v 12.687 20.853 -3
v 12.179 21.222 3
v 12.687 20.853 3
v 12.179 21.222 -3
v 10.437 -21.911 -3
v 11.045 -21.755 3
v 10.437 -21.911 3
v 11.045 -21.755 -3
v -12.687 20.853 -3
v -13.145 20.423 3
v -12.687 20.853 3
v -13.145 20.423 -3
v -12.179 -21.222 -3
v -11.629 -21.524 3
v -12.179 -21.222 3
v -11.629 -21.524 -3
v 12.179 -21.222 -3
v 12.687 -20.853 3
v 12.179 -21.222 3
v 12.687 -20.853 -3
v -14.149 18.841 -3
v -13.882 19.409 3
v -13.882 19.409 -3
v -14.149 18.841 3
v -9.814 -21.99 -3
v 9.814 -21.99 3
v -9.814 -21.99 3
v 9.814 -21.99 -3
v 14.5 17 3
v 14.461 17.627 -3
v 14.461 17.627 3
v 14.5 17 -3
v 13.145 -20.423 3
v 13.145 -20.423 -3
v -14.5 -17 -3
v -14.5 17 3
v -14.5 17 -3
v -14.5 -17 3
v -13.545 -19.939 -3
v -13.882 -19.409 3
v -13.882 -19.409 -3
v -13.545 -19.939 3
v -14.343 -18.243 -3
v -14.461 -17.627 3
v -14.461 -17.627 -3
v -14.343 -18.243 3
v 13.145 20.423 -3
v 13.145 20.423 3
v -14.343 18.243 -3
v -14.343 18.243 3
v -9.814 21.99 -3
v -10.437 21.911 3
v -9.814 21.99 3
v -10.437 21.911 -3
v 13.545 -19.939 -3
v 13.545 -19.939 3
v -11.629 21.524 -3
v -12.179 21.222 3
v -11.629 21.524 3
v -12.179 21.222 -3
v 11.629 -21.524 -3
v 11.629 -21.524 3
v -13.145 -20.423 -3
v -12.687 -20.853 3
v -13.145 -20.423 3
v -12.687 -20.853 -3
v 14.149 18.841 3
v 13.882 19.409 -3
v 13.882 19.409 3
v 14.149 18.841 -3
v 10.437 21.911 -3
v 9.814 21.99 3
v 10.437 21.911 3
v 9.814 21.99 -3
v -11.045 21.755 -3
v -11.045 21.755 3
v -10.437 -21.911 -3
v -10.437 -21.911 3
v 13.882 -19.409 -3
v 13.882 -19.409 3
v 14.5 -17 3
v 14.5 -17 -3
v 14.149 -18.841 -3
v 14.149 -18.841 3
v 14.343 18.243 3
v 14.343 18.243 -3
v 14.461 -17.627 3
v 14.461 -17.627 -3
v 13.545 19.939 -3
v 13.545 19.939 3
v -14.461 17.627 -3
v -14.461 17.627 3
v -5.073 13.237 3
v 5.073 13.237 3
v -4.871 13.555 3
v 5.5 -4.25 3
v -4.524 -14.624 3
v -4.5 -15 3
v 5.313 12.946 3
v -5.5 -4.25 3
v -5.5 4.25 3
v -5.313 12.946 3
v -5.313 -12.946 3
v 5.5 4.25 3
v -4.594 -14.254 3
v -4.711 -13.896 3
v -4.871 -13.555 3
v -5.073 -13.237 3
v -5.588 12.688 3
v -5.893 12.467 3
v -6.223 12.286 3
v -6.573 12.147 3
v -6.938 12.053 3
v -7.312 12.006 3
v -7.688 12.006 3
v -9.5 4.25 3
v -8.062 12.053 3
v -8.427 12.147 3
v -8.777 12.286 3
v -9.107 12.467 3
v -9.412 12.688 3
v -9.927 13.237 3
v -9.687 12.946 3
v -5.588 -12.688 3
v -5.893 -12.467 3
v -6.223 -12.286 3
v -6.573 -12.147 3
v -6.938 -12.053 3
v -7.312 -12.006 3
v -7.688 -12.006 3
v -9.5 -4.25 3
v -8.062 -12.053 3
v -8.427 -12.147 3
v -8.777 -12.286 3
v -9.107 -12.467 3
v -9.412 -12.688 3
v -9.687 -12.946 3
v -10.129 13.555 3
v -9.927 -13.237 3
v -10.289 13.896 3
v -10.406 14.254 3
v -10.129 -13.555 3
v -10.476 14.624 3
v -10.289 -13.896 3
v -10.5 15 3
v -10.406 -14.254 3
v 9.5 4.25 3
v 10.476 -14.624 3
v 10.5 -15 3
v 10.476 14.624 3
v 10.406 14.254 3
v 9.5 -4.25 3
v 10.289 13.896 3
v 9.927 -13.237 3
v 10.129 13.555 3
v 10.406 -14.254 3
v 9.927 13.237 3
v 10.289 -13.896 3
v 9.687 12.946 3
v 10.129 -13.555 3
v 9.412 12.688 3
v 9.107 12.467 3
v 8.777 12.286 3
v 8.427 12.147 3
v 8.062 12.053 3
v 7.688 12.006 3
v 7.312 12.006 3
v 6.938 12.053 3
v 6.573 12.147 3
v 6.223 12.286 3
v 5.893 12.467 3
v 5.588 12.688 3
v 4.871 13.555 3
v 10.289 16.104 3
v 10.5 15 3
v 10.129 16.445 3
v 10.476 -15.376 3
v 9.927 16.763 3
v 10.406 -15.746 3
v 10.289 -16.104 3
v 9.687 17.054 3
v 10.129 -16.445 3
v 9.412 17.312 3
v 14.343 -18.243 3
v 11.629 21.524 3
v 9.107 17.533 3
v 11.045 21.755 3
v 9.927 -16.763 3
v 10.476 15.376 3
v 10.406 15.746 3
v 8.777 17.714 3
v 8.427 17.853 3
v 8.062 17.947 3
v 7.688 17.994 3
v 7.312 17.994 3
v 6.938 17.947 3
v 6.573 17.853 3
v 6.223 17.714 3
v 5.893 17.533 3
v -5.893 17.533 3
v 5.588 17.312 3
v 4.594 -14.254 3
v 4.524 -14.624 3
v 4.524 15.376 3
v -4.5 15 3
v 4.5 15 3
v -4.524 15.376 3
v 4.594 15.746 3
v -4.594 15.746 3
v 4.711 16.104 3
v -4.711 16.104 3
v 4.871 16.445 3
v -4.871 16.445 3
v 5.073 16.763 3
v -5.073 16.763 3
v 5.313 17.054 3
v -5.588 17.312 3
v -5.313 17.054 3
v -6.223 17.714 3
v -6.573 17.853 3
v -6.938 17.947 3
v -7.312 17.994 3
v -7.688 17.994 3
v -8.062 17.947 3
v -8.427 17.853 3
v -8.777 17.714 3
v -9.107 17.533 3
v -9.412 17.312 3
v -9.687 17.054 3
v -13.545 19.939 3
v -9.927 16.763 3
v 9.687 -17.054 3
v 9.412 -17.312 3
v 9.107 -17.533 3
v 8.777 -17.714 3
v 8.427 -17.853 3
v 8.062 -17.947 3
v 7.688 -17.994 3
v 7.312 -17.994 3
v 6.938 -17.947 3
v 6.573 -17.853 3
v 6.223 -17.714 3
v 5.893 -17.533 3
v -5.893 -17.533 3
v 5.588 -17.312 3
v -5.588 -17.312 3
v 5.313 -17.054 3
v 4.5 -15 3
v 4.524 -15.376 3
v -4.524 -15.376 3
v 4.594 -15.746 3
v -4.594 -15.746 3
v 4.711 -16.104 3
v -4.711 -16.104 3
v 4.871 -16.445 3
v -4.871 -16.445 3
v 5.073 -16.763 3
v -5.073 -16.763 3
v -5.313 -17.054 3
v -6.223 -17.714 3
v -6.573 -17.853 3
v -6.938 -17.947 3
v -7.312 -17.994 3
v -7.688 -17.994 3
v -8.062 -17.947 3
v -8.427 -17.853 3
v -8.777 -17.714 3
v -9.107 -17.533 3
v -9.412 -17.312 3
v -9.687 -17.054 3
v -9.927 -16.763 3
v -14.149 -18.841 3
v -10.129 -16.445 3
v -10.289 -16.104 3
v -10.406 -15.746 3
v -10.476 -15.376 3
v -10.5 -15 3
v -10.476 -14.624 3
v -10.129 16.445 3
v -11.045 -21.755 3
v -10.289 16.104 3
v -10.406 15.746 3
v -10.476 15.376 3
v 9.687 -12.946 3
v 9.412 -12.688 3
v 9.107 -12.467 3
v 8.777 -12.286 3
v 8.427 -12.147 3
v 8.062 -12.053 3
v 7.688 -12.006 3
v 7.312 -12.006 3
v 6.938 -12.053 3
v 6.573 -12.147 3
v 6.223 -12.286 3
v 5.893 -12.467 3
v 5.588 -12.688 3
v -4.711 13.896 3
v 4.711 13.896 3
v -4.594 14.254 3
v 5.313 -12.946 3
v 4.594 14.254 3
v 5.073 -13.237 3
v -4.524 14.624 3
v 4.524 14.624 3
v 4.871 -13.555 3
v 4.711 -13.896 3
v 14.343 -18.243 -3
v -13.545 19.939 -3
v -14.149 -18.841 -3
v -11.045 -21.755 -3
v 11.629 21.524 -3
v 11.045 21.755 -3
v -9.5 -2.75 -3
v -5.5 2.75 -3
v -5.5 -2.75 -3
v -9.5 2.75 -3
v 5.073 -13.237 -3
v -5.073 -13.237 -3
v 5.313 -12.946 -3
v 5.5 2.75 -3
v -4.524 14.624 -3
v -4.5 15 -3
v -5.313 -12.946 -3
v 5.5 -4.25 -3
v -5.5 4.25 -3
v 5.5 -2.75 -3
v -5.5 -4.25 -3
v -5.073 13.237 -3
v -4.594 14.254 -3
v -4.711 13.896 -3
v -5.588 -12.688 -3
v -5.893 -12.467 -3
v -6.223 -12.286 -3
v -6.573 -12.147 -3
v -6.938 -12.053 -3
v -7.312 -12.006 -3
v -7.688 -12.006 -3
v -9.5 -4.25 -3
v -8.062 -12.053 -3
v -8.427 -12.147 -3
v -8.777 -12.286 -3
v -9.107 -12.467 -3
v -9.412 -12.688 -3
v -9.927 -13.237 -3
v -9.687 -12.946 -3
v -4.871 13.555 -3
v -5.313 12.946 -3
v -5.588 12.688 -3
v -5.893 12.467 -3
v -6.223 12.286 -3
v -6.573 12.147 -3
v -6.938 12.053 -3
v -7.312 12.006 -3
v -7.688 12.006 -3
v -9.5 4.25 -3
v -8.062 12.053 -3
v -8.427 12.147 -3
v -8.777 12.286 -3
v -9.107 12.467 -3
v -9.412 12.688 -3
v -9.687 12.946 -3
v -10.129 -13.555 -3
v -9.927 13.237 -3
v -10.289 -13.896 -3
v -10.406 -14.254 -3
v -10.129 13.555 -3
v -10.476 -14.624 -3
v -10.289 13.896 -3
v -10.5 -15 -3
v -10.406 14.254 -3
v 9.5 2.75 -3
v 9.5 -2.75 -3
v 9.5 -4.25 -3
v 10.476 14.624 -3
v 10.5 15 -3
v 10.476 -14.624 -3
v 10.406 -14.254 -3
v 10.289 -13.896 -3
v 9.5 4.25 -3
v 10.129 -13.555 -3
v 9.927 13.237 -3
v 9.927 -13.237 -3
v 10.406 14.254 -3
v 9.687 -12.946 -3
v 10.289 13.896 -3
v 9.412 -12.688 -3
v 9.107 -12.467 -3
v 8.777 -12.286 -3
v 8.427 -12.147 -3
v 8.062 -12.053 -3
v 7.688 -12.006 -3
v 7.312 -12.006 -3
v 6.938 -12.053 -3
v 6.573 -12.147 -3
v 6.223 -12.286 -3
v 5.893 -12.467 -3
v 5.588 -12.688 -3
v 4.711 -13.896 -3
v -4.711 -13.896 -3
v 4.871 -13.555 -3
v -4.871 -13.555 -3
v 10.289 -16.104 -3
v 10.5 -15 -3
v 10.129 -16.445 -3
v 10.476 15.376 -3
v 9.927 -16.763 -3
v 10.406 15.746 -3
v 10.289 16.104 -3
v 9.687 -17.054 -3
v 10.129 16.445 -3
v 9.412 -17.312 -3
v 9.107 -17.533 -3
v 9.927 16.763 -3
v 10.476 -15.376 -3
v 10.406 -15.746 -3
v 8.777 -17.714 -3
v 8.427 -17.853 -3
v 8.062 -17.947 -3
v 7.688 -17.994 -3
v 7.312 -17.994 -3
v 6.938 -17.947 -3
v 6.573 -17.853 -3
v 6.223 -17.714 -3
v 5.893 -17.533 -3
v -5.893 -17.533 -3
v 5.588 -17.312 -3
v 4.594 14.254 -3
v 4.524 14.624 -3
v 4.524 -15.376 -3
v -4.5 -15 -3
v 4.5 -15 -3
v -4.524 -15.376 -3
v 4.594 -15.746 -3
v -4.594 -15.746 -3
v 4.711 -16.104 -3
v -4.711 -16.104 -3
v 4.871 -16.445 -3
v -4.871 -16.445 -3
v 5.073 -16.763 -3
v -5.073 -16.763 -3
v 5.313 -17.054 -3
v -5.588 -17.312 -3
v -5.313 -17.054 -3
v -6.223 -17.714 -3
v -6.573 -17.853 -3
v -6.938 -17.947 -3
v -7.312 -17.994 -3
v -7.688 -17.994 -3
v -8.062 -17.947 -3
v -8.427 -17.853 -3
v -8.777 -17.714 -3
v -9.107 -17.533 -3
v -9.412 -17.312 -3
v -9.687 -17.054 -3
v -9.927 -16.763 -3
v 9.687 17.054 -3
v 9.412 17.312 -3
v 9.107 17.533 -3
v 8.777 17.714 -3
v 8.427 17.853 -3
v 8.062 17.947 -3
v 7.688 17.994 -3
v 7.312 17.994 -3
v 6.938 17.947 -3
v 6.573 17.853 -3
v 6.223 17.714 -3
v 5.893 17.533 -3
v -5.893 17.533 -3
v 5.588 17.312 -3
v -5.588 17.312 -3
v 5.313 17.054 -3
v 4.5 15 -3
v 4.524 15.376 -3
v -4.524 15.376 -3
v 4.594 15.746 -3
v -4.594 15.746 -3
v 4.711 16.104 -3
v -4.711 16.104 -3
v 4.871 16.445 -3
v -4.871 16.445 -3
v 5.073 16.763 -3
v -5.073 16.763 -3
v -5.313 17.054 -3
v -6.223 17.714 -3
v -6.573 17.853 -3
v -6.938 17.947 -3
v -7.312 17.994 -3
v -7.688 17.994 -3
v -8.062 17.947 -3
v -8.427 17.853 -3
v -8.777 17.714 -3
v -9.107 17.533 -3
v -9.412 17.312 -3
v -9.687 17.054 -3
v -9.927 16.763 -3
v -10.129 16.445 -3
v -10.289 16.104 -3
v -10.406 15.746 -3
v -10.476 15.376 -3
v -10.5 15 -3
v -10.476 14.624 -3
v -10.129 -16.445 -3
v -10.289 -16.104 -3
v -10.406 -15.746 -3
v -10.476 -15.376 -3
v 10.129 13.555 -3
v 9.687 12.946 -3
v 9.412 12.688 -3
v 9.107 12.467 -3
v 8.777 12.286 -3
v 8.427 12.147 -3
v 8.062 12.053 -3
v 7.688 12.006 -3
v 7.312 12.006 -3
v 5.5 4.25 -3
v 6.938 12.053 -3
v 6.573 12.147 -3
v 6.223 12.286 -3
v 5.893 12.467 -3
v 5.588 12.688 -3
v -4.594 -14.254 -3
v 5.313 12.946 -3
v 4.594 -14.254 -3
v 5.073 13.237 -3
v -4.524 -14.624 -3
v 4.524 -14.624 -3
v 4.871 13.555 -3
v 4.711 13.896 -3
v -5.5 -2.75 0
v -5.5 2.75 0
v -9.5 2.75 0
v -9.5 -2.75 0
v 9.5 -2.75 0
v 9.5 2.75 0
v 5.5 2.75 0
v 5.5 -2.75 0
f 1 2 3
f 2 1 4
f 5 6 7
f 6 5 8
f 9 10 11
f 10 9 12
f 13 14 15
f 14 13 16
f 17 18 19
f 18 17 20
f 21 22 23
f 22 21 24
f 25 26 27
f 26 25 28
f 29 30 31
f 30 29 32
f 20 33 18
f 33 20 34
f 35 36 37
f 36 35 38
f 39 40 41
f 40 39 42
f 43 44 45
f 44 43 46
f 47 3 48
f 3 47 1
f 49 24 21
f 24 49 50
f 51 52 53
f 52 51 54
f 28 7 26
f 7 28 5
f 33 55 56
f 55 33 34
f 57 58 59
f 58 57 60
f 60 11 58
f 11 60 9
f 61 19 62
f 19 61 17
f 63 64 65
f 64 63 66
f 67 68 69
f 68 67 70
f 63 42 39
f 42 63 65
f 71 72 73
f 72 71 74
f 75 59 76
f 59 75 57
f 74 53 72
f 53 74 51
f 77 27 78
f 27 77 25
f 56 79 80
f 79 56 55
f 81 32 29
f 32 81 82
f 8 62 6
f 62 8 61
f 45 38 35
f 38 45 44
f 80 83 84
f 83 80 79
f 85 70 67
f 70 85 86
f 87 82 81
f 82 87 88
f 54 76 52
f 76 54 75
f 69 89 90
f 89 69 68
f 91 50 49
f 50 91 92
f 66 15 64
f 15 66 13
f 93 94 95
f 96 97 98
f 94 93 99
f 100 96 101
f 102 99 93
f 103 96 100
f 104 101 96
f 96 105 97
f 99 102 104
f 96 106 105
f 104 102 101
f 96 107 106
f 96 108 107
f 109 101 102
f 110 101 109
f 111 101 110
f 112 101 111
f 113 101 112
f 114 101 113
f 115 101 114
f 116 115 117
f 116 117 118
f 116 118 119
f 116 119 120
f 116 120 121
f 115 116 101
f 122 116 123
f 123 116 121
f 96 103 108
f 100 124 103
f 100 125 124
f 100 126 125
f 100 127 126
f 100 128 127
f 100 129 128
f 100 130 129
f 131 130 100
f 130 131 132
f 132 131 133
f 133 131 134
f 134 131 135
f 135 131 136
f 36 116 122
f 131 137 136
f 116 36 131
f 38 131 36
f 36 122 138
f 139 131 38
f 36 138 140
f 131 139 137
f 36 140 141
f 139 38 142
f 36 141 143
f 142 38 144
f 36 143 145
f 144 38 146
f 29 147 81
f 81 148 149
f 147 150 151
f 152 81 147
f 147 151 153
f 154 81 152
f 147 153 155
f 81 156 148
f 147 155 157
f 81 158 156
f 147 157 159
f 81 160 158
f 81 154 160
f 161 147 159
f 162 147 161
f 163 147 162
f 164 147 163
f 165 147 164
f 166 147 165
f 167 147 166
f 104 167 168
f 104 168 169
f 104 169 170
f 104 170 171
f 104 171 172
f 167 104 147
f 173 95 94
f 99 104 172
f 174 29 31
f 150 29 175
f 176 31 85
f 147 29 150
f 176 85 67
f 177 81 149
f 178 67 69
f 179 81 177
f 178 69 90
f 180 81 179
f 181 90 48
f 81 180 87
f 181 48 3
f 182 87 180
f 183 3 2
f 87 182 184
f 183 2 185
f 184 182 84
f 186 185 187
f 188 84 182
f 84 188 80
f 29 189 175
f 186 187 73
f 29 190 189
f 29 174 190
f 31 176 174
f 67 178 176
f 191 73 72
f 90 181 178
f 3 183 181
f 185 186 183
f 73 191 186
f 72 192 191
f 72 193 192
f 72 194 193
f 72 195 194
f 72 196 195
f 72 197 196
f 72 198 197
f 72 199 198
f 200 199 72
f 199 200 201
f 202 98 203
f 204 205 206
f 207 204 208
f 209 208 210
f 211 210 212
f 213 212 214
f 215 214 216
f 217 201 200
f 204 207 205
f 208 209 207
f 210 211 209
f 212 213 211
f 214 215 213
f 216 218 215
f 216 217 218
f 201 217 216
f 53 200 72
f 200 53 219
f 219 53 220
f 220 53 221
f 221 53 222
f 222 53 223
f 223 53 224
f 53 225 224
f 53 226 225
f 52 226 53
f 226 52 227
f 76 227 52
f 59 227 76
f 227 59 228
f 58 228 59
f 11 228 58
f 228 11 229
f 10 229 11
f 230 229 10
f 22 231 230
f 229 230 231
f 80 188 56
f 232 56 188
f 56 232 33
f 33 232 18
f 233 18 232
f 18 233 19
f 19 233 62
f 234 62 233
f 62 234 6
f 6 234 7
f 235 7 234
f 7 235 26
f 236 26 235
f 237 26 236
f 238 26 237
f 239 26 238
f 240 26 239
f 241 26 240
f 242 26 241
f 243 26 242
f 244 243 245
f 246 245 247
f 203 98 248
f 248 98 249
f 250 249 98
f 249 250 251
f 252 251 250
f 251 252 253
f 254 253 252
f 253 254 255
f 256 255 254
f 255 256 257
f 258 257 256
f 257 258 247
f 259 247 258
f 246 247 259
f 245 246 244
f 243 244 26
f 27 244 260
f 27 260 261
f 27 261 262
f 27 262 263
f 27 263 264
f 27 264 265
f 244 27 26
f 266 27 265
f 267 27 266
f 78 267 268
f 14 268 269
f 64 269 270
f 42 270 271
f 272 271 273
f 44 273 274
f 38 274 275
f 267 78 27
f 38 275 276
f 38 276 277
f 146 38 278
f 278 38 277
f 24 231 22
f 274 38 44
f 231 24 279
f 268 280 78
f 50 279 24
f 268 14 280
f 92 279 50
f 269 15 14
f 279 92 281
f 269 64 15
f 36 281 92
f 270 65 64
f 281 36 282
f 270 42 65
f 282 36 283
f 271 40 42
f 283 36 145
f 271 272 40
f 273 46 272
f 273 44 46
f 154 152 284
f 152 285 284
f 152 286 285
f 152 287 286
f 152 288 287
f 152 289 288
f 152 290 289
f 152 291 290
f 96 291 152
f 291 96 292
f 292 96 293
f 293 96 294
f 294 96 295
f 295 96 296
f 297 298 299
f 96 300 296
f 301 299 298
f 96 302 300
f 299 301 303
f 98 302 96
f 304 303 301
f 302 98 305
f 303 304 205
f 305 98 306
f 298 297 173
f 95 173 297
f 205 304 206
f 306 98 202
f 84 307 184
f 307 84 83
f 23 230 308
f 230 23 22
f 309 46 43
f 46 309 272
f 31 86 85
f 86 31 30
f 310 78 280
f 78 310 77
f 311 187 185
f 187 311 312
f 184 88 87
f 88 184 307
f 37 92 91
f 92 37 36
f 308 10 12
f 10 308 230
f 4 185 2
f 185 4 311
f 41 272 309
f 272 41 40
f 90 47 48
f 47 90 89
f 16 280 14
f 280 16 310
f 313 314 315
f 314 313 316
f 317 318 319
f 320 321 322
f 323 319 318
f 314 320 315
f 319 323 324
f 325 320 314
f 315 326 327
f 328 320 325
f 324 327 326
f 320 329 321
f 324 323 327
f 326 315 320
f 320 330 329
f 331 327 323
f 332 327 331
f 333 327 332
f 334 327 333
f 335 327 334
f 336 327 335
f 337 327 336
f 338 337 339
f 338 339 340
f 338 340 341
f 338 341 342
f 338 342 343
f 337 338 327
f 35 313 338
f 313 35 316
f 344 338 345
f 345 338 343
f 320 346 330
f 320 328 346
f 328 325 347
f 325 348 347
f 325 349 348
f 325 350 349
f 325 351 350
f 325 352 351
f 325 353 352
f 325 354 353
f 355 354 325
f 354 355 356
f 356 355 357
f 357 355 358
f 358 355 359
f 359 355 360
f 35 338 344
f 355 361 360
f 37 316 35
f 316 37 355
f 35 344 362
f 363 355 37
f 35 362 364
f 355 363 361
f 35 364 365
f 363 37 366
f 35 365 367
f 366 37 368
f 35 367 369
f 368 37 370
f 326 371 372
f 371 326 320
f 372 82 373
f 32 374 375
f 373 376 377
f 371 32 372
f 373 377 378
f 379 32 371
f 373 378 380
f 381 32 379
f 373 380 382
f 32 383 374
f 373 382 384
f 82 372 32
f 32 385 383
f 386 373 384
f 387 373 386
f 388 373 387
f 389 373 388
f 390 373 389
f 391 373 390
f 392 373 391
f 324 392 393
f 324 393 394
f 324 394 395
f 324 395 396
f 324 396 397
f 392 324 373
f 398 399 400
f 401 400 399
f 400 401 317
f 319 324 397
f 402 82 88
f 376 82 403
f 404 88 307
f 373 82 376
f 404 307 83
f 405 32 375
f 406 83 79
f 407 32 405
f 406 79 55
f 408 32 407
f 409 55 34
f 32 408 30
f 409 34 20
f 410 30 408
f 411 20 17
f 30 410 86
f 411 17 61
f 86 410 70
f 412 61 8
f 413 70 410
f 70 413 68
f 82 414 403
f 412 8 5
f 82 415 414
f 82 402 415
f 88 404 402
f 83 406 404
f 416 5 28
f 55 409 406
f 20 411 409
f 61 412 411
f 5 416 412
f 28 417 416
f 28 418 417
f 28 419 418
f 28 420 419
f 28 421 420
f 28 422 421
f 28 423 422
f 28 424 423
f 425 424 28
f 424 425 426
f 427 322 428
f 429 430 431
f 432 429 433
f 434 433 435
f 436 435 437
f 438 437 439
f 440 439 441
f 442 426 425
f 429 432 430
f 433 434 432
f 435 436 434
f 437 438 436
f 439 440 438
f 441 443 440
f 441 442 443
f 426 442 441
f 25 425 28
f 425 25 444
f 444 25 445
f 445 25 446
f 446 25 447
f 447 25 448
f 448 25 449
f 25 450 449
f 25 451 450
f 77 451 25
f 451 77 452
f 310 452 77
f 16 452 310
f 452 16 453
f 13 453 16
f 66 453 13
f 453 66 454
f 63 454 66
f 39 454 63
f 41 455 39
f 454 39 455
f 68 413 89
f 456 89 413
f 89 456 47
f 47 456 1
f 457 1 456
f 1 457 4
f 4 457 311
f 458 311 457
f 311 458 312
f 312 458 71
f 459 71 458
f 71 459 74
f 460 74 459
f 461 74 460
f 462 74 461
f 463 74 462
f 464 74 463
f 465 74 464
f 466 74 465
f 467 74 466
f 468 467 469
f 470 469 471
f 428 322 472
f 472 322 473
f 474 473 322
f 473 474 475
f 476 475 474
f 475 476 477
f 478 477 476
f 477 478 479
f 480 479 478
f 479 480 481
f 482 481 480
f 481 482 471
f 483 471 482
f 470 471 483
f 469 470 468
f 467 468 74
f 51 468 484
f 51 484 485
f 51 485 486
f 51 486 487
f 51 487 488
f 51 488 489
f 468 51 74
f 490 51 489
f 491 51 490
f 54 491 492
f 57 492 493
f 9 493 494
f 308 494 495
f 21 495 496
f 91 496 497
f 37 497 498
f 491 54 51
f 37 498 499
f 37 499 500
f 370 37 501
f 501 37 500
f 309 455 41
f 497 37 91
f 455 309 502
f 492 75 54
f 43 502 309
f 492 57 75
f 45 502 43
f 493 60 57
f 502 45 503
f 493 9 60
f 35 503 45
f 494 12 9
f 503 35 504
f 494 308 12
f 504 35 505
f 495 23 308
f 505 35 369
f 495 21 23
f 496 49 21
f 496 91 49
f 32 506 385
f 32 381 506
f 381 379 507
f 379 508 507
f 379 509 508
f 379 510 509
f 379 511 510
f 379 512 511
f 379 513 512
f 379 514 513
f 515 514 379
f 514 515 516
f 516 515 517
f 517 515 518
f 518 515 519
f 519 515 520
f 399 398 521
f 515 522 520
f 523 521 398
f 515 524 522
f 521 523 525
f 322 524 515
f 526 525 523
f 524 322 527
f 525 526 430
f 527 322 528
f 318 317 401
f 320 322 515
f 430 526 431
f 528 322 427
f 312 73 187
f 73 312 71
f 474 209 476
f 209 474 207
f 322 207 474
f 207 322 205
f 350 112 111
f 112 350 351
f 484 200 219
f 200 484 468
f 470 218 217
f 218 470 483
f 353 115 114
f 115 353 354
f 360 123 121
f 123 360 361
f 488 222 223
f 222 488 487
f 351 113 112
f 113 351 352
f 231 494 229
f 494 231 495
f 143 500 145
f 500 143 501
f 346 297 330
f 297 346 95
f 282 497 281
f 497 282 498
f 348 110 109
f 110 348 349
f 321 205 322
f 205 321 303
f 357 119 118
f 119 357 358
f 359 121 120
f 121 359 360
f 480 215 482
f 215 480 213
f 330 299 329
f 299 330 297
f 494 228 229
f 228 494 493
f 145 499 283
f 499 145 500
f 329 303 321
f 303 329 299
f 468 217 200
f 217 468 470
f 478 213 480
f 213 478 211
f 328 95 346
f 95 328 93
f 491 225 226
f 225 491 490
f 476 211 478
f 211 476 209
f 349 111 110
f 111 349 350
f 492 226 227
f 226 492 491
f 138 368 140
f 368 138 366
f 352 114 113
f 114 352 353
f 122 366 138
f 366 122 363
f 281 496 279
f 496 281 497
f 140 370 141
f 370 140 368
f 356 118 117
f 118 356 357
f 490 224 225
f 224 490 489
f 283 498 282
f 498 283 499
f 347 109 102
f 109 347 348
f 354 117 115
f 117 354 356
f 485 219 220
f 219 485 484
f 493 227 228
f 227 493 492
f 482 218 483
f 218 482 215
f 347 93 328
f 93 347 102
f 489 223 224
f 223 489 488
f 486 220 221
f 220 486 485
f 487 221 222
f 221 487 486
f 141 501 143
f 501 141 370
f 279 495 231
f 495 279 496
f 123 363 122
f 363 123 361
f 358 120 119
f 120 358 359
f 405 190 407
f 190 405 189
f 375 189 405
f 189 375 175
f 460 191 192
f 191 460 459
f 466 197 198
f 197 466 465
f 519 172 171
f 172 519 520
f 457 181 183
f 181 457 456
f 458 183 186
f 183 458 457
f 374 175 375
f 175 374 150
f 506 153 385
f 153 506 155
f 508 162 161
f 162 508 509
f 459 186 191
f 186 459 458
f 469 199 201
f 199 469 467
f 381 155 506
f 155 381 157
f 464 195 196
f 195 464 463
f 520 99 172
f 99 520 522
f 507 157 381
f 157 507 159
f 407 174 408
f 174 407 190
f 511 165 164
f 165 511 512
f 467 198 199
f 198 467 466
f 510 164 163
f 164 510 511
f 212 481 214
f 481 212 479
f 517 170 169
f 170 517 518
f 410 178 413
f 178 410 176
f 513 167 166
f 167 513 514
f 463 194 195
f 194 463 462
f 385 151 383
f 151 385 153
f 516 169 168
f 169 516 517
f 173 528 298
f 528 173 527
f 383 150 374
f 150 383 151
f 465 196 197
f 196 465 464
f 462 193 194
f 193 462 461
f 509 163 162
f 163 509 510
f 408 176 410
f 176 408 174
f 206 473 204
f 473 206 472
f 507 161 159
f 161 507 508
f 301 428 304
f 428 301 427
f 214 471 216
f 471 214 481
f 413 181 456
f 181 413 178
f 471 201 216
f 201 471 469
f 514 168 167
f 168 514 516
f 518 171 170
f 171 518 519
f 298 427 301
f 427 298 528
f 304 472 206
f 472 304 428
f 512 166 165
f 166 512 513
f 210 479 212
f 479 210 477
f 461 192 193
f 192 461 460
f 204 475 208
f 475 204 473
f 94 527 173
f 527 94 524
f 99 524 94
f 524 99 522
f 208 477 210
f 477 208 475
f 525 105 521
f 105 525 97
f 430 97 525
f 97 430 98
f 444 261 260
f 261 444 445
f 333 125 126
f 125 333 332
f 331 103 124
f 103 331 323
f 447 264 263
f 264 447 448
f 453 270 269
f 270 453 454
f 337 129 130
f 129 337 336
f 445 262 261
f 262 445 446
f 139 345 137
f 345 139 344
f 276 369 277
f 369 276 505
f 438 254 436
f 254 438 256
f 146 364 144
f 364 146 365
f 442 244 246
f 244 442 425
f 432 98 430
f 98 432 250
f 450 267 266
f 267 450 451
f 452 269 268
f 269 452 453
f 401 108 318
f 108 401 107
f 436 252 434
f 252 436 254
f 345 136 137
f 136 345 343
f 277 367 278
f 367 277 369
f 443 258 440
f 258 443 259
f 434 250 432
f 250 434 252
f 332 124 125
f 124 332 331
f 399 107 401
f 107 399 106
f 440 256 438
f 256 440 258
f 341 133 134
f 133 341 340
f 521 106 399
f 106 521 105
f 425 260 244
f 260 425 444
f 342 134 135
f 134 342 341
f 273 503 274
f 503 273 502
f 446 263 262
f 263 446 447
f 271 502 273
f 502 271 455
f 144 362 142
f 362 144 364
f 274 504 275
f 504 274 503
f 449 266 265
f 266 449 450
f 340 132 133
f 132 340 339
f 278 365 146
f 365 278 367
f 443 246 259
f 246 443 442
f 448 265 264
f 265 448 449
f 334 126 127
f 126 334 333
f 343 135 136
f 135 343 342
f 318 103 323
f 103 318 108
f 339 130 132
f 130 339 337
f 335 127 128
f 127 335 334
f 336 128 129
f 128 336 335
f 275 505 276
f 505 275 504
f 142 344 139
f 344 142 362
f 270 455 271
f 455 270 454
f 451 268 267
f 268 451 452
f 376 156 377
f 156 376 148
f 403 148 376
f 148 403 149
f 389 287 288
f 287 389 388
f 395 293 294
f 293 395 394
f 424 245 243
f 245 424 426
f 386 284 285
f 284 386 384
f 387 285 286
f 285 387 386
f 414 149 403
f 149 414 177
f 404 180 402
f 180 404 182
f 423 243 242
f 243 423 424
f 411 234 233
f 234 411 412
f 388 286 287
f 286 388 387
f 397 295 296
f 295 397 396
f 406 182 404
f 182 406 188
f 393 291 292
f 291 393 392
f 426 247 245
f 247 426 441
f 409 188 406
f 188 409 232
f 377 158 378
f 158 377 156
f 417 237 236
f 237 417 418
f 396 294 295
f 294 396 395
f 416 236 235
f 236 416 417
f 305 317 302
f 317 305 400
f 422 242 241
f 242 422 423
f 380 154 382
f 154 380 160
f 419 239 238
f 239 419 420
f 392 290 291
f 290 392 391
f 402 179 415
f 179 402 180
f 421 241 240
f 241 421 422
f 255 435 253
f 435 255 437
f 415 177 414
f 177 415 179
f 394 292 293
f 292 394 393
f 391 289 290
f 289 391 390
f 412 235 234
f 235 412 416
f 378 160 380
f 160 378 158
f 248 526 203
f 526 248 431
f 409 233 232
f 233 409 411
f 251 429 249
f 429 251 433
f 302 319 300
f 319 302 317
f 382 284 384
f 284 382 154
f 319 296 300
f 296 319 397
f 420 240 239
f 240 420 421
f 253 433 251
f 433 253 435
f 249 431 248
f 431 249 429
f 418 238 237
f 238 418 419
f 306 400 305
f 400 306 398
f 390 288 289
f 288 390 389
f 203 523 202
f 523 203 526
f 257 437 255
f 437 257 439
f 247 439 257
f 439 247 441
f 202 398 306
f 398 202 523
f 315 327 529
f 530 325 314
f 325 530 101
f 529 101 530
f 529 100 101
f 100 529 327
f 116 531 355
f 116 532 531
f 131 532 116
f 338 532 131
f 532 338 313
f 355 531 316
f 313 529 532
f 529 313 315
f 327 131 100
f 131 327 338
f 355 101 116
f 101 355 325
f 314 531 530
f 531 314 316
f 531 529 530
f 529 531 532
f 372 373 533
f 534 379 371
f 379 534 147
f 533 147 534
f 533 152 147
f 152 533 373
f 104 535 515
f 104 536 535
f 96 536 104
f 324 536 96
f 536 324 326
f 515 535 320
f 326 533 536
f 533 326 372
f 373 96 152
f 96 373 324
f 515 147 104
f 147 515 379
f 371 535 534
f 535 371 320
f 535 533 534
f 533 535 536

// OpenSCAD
$fn = 50;


difference() {
	union() {
		translate(v = [0, 0, -3.0000000000]) {
			hull() {
				translate(v = [-9.5000000000, 17.0000000000, 0]) {
					cylinder(h = 6, r = 5);
				}
				translate(v = [9.5000000000, 17.0000000000, 0]) {
					cylinder(h = 6, r = 5);
				}
				translate(v = [-9.5000000000, -17.0000000000, 0]) {
					cylinder(h = 6, r = 5);
				}
				translate(v = [9.5000000000, -17.0000000000, 0]) {
					cylinder(h = 6, r = 5);
				}
			}
		}
		translate(v = [0, 0, -3.0000000000]) {
			hull() {
				translate(v = [-9.5000000000, 17.0000000000, 0]) {
					cylinder(h = 6, r = 5);
				}
				translate(v = [9.5000000000, 17.0000000000, 0]) {
					cylinder(h = 6, r = 5);
				}
				translate(v = [-9.5000000000, -17.0000000000, 0]) {
					cylinder(h = 6, r = 5);
				}
				translate(v = [9.5000000000, -17.0000000000, 0]) {
					cylinder(h = 6, r = 5);
				}
			}
		}
	}
	union() {
		translate(v = [-7.5000000000, 15.0000000000, -100.0000000000]) {
			cylinder(h = 200, r = 3.0000000000);
		}
		translate(v = [7.5000000000, 15.0000000000, -100.0000000000]) {
			cylinder(h = 200, r = 3.0000000000);
		}
		translate(v = [-7.5000000000, -15.0000000000, -100.0000000000]) {
			cylinder(h = 200, r = 3.0000000000);
		}
		translate(v = [7.5000000000, -15.0000000000, -100.0000000000]) {
			cylinder(h = 200, r = 3.0000000000);
		}
		translate(v = [-9.5000000000, -4.2500000000, -50]) {
			cube(size = [4, 1.5000000000, 100]);
		}
		translate(v = [-9.5000000000, 2.7500000000, -50]) {
			cube(size = [4, 1.5000000000, 100]);
		}
		translate(v = [-9.5000000000, -4.2500000000, 0]) {
			cube(size = [4, 8.5000000000, 3]);
		}
		translate(v = [5.5000000000, -4.2500000000, -50]) {
			cube(size = [4, 1.5000000000, 100]);
		}
		translate(v = [5.5000000000, 2.7500000000, -50]) {
			cube(size = [4, 1.5000000000, 100]);
		}
		translate(v = [5.5000000000, -4.2500000000, 0]) {
			cube(size = [4, 8.5000000000, 3]);
		}
	}
}
